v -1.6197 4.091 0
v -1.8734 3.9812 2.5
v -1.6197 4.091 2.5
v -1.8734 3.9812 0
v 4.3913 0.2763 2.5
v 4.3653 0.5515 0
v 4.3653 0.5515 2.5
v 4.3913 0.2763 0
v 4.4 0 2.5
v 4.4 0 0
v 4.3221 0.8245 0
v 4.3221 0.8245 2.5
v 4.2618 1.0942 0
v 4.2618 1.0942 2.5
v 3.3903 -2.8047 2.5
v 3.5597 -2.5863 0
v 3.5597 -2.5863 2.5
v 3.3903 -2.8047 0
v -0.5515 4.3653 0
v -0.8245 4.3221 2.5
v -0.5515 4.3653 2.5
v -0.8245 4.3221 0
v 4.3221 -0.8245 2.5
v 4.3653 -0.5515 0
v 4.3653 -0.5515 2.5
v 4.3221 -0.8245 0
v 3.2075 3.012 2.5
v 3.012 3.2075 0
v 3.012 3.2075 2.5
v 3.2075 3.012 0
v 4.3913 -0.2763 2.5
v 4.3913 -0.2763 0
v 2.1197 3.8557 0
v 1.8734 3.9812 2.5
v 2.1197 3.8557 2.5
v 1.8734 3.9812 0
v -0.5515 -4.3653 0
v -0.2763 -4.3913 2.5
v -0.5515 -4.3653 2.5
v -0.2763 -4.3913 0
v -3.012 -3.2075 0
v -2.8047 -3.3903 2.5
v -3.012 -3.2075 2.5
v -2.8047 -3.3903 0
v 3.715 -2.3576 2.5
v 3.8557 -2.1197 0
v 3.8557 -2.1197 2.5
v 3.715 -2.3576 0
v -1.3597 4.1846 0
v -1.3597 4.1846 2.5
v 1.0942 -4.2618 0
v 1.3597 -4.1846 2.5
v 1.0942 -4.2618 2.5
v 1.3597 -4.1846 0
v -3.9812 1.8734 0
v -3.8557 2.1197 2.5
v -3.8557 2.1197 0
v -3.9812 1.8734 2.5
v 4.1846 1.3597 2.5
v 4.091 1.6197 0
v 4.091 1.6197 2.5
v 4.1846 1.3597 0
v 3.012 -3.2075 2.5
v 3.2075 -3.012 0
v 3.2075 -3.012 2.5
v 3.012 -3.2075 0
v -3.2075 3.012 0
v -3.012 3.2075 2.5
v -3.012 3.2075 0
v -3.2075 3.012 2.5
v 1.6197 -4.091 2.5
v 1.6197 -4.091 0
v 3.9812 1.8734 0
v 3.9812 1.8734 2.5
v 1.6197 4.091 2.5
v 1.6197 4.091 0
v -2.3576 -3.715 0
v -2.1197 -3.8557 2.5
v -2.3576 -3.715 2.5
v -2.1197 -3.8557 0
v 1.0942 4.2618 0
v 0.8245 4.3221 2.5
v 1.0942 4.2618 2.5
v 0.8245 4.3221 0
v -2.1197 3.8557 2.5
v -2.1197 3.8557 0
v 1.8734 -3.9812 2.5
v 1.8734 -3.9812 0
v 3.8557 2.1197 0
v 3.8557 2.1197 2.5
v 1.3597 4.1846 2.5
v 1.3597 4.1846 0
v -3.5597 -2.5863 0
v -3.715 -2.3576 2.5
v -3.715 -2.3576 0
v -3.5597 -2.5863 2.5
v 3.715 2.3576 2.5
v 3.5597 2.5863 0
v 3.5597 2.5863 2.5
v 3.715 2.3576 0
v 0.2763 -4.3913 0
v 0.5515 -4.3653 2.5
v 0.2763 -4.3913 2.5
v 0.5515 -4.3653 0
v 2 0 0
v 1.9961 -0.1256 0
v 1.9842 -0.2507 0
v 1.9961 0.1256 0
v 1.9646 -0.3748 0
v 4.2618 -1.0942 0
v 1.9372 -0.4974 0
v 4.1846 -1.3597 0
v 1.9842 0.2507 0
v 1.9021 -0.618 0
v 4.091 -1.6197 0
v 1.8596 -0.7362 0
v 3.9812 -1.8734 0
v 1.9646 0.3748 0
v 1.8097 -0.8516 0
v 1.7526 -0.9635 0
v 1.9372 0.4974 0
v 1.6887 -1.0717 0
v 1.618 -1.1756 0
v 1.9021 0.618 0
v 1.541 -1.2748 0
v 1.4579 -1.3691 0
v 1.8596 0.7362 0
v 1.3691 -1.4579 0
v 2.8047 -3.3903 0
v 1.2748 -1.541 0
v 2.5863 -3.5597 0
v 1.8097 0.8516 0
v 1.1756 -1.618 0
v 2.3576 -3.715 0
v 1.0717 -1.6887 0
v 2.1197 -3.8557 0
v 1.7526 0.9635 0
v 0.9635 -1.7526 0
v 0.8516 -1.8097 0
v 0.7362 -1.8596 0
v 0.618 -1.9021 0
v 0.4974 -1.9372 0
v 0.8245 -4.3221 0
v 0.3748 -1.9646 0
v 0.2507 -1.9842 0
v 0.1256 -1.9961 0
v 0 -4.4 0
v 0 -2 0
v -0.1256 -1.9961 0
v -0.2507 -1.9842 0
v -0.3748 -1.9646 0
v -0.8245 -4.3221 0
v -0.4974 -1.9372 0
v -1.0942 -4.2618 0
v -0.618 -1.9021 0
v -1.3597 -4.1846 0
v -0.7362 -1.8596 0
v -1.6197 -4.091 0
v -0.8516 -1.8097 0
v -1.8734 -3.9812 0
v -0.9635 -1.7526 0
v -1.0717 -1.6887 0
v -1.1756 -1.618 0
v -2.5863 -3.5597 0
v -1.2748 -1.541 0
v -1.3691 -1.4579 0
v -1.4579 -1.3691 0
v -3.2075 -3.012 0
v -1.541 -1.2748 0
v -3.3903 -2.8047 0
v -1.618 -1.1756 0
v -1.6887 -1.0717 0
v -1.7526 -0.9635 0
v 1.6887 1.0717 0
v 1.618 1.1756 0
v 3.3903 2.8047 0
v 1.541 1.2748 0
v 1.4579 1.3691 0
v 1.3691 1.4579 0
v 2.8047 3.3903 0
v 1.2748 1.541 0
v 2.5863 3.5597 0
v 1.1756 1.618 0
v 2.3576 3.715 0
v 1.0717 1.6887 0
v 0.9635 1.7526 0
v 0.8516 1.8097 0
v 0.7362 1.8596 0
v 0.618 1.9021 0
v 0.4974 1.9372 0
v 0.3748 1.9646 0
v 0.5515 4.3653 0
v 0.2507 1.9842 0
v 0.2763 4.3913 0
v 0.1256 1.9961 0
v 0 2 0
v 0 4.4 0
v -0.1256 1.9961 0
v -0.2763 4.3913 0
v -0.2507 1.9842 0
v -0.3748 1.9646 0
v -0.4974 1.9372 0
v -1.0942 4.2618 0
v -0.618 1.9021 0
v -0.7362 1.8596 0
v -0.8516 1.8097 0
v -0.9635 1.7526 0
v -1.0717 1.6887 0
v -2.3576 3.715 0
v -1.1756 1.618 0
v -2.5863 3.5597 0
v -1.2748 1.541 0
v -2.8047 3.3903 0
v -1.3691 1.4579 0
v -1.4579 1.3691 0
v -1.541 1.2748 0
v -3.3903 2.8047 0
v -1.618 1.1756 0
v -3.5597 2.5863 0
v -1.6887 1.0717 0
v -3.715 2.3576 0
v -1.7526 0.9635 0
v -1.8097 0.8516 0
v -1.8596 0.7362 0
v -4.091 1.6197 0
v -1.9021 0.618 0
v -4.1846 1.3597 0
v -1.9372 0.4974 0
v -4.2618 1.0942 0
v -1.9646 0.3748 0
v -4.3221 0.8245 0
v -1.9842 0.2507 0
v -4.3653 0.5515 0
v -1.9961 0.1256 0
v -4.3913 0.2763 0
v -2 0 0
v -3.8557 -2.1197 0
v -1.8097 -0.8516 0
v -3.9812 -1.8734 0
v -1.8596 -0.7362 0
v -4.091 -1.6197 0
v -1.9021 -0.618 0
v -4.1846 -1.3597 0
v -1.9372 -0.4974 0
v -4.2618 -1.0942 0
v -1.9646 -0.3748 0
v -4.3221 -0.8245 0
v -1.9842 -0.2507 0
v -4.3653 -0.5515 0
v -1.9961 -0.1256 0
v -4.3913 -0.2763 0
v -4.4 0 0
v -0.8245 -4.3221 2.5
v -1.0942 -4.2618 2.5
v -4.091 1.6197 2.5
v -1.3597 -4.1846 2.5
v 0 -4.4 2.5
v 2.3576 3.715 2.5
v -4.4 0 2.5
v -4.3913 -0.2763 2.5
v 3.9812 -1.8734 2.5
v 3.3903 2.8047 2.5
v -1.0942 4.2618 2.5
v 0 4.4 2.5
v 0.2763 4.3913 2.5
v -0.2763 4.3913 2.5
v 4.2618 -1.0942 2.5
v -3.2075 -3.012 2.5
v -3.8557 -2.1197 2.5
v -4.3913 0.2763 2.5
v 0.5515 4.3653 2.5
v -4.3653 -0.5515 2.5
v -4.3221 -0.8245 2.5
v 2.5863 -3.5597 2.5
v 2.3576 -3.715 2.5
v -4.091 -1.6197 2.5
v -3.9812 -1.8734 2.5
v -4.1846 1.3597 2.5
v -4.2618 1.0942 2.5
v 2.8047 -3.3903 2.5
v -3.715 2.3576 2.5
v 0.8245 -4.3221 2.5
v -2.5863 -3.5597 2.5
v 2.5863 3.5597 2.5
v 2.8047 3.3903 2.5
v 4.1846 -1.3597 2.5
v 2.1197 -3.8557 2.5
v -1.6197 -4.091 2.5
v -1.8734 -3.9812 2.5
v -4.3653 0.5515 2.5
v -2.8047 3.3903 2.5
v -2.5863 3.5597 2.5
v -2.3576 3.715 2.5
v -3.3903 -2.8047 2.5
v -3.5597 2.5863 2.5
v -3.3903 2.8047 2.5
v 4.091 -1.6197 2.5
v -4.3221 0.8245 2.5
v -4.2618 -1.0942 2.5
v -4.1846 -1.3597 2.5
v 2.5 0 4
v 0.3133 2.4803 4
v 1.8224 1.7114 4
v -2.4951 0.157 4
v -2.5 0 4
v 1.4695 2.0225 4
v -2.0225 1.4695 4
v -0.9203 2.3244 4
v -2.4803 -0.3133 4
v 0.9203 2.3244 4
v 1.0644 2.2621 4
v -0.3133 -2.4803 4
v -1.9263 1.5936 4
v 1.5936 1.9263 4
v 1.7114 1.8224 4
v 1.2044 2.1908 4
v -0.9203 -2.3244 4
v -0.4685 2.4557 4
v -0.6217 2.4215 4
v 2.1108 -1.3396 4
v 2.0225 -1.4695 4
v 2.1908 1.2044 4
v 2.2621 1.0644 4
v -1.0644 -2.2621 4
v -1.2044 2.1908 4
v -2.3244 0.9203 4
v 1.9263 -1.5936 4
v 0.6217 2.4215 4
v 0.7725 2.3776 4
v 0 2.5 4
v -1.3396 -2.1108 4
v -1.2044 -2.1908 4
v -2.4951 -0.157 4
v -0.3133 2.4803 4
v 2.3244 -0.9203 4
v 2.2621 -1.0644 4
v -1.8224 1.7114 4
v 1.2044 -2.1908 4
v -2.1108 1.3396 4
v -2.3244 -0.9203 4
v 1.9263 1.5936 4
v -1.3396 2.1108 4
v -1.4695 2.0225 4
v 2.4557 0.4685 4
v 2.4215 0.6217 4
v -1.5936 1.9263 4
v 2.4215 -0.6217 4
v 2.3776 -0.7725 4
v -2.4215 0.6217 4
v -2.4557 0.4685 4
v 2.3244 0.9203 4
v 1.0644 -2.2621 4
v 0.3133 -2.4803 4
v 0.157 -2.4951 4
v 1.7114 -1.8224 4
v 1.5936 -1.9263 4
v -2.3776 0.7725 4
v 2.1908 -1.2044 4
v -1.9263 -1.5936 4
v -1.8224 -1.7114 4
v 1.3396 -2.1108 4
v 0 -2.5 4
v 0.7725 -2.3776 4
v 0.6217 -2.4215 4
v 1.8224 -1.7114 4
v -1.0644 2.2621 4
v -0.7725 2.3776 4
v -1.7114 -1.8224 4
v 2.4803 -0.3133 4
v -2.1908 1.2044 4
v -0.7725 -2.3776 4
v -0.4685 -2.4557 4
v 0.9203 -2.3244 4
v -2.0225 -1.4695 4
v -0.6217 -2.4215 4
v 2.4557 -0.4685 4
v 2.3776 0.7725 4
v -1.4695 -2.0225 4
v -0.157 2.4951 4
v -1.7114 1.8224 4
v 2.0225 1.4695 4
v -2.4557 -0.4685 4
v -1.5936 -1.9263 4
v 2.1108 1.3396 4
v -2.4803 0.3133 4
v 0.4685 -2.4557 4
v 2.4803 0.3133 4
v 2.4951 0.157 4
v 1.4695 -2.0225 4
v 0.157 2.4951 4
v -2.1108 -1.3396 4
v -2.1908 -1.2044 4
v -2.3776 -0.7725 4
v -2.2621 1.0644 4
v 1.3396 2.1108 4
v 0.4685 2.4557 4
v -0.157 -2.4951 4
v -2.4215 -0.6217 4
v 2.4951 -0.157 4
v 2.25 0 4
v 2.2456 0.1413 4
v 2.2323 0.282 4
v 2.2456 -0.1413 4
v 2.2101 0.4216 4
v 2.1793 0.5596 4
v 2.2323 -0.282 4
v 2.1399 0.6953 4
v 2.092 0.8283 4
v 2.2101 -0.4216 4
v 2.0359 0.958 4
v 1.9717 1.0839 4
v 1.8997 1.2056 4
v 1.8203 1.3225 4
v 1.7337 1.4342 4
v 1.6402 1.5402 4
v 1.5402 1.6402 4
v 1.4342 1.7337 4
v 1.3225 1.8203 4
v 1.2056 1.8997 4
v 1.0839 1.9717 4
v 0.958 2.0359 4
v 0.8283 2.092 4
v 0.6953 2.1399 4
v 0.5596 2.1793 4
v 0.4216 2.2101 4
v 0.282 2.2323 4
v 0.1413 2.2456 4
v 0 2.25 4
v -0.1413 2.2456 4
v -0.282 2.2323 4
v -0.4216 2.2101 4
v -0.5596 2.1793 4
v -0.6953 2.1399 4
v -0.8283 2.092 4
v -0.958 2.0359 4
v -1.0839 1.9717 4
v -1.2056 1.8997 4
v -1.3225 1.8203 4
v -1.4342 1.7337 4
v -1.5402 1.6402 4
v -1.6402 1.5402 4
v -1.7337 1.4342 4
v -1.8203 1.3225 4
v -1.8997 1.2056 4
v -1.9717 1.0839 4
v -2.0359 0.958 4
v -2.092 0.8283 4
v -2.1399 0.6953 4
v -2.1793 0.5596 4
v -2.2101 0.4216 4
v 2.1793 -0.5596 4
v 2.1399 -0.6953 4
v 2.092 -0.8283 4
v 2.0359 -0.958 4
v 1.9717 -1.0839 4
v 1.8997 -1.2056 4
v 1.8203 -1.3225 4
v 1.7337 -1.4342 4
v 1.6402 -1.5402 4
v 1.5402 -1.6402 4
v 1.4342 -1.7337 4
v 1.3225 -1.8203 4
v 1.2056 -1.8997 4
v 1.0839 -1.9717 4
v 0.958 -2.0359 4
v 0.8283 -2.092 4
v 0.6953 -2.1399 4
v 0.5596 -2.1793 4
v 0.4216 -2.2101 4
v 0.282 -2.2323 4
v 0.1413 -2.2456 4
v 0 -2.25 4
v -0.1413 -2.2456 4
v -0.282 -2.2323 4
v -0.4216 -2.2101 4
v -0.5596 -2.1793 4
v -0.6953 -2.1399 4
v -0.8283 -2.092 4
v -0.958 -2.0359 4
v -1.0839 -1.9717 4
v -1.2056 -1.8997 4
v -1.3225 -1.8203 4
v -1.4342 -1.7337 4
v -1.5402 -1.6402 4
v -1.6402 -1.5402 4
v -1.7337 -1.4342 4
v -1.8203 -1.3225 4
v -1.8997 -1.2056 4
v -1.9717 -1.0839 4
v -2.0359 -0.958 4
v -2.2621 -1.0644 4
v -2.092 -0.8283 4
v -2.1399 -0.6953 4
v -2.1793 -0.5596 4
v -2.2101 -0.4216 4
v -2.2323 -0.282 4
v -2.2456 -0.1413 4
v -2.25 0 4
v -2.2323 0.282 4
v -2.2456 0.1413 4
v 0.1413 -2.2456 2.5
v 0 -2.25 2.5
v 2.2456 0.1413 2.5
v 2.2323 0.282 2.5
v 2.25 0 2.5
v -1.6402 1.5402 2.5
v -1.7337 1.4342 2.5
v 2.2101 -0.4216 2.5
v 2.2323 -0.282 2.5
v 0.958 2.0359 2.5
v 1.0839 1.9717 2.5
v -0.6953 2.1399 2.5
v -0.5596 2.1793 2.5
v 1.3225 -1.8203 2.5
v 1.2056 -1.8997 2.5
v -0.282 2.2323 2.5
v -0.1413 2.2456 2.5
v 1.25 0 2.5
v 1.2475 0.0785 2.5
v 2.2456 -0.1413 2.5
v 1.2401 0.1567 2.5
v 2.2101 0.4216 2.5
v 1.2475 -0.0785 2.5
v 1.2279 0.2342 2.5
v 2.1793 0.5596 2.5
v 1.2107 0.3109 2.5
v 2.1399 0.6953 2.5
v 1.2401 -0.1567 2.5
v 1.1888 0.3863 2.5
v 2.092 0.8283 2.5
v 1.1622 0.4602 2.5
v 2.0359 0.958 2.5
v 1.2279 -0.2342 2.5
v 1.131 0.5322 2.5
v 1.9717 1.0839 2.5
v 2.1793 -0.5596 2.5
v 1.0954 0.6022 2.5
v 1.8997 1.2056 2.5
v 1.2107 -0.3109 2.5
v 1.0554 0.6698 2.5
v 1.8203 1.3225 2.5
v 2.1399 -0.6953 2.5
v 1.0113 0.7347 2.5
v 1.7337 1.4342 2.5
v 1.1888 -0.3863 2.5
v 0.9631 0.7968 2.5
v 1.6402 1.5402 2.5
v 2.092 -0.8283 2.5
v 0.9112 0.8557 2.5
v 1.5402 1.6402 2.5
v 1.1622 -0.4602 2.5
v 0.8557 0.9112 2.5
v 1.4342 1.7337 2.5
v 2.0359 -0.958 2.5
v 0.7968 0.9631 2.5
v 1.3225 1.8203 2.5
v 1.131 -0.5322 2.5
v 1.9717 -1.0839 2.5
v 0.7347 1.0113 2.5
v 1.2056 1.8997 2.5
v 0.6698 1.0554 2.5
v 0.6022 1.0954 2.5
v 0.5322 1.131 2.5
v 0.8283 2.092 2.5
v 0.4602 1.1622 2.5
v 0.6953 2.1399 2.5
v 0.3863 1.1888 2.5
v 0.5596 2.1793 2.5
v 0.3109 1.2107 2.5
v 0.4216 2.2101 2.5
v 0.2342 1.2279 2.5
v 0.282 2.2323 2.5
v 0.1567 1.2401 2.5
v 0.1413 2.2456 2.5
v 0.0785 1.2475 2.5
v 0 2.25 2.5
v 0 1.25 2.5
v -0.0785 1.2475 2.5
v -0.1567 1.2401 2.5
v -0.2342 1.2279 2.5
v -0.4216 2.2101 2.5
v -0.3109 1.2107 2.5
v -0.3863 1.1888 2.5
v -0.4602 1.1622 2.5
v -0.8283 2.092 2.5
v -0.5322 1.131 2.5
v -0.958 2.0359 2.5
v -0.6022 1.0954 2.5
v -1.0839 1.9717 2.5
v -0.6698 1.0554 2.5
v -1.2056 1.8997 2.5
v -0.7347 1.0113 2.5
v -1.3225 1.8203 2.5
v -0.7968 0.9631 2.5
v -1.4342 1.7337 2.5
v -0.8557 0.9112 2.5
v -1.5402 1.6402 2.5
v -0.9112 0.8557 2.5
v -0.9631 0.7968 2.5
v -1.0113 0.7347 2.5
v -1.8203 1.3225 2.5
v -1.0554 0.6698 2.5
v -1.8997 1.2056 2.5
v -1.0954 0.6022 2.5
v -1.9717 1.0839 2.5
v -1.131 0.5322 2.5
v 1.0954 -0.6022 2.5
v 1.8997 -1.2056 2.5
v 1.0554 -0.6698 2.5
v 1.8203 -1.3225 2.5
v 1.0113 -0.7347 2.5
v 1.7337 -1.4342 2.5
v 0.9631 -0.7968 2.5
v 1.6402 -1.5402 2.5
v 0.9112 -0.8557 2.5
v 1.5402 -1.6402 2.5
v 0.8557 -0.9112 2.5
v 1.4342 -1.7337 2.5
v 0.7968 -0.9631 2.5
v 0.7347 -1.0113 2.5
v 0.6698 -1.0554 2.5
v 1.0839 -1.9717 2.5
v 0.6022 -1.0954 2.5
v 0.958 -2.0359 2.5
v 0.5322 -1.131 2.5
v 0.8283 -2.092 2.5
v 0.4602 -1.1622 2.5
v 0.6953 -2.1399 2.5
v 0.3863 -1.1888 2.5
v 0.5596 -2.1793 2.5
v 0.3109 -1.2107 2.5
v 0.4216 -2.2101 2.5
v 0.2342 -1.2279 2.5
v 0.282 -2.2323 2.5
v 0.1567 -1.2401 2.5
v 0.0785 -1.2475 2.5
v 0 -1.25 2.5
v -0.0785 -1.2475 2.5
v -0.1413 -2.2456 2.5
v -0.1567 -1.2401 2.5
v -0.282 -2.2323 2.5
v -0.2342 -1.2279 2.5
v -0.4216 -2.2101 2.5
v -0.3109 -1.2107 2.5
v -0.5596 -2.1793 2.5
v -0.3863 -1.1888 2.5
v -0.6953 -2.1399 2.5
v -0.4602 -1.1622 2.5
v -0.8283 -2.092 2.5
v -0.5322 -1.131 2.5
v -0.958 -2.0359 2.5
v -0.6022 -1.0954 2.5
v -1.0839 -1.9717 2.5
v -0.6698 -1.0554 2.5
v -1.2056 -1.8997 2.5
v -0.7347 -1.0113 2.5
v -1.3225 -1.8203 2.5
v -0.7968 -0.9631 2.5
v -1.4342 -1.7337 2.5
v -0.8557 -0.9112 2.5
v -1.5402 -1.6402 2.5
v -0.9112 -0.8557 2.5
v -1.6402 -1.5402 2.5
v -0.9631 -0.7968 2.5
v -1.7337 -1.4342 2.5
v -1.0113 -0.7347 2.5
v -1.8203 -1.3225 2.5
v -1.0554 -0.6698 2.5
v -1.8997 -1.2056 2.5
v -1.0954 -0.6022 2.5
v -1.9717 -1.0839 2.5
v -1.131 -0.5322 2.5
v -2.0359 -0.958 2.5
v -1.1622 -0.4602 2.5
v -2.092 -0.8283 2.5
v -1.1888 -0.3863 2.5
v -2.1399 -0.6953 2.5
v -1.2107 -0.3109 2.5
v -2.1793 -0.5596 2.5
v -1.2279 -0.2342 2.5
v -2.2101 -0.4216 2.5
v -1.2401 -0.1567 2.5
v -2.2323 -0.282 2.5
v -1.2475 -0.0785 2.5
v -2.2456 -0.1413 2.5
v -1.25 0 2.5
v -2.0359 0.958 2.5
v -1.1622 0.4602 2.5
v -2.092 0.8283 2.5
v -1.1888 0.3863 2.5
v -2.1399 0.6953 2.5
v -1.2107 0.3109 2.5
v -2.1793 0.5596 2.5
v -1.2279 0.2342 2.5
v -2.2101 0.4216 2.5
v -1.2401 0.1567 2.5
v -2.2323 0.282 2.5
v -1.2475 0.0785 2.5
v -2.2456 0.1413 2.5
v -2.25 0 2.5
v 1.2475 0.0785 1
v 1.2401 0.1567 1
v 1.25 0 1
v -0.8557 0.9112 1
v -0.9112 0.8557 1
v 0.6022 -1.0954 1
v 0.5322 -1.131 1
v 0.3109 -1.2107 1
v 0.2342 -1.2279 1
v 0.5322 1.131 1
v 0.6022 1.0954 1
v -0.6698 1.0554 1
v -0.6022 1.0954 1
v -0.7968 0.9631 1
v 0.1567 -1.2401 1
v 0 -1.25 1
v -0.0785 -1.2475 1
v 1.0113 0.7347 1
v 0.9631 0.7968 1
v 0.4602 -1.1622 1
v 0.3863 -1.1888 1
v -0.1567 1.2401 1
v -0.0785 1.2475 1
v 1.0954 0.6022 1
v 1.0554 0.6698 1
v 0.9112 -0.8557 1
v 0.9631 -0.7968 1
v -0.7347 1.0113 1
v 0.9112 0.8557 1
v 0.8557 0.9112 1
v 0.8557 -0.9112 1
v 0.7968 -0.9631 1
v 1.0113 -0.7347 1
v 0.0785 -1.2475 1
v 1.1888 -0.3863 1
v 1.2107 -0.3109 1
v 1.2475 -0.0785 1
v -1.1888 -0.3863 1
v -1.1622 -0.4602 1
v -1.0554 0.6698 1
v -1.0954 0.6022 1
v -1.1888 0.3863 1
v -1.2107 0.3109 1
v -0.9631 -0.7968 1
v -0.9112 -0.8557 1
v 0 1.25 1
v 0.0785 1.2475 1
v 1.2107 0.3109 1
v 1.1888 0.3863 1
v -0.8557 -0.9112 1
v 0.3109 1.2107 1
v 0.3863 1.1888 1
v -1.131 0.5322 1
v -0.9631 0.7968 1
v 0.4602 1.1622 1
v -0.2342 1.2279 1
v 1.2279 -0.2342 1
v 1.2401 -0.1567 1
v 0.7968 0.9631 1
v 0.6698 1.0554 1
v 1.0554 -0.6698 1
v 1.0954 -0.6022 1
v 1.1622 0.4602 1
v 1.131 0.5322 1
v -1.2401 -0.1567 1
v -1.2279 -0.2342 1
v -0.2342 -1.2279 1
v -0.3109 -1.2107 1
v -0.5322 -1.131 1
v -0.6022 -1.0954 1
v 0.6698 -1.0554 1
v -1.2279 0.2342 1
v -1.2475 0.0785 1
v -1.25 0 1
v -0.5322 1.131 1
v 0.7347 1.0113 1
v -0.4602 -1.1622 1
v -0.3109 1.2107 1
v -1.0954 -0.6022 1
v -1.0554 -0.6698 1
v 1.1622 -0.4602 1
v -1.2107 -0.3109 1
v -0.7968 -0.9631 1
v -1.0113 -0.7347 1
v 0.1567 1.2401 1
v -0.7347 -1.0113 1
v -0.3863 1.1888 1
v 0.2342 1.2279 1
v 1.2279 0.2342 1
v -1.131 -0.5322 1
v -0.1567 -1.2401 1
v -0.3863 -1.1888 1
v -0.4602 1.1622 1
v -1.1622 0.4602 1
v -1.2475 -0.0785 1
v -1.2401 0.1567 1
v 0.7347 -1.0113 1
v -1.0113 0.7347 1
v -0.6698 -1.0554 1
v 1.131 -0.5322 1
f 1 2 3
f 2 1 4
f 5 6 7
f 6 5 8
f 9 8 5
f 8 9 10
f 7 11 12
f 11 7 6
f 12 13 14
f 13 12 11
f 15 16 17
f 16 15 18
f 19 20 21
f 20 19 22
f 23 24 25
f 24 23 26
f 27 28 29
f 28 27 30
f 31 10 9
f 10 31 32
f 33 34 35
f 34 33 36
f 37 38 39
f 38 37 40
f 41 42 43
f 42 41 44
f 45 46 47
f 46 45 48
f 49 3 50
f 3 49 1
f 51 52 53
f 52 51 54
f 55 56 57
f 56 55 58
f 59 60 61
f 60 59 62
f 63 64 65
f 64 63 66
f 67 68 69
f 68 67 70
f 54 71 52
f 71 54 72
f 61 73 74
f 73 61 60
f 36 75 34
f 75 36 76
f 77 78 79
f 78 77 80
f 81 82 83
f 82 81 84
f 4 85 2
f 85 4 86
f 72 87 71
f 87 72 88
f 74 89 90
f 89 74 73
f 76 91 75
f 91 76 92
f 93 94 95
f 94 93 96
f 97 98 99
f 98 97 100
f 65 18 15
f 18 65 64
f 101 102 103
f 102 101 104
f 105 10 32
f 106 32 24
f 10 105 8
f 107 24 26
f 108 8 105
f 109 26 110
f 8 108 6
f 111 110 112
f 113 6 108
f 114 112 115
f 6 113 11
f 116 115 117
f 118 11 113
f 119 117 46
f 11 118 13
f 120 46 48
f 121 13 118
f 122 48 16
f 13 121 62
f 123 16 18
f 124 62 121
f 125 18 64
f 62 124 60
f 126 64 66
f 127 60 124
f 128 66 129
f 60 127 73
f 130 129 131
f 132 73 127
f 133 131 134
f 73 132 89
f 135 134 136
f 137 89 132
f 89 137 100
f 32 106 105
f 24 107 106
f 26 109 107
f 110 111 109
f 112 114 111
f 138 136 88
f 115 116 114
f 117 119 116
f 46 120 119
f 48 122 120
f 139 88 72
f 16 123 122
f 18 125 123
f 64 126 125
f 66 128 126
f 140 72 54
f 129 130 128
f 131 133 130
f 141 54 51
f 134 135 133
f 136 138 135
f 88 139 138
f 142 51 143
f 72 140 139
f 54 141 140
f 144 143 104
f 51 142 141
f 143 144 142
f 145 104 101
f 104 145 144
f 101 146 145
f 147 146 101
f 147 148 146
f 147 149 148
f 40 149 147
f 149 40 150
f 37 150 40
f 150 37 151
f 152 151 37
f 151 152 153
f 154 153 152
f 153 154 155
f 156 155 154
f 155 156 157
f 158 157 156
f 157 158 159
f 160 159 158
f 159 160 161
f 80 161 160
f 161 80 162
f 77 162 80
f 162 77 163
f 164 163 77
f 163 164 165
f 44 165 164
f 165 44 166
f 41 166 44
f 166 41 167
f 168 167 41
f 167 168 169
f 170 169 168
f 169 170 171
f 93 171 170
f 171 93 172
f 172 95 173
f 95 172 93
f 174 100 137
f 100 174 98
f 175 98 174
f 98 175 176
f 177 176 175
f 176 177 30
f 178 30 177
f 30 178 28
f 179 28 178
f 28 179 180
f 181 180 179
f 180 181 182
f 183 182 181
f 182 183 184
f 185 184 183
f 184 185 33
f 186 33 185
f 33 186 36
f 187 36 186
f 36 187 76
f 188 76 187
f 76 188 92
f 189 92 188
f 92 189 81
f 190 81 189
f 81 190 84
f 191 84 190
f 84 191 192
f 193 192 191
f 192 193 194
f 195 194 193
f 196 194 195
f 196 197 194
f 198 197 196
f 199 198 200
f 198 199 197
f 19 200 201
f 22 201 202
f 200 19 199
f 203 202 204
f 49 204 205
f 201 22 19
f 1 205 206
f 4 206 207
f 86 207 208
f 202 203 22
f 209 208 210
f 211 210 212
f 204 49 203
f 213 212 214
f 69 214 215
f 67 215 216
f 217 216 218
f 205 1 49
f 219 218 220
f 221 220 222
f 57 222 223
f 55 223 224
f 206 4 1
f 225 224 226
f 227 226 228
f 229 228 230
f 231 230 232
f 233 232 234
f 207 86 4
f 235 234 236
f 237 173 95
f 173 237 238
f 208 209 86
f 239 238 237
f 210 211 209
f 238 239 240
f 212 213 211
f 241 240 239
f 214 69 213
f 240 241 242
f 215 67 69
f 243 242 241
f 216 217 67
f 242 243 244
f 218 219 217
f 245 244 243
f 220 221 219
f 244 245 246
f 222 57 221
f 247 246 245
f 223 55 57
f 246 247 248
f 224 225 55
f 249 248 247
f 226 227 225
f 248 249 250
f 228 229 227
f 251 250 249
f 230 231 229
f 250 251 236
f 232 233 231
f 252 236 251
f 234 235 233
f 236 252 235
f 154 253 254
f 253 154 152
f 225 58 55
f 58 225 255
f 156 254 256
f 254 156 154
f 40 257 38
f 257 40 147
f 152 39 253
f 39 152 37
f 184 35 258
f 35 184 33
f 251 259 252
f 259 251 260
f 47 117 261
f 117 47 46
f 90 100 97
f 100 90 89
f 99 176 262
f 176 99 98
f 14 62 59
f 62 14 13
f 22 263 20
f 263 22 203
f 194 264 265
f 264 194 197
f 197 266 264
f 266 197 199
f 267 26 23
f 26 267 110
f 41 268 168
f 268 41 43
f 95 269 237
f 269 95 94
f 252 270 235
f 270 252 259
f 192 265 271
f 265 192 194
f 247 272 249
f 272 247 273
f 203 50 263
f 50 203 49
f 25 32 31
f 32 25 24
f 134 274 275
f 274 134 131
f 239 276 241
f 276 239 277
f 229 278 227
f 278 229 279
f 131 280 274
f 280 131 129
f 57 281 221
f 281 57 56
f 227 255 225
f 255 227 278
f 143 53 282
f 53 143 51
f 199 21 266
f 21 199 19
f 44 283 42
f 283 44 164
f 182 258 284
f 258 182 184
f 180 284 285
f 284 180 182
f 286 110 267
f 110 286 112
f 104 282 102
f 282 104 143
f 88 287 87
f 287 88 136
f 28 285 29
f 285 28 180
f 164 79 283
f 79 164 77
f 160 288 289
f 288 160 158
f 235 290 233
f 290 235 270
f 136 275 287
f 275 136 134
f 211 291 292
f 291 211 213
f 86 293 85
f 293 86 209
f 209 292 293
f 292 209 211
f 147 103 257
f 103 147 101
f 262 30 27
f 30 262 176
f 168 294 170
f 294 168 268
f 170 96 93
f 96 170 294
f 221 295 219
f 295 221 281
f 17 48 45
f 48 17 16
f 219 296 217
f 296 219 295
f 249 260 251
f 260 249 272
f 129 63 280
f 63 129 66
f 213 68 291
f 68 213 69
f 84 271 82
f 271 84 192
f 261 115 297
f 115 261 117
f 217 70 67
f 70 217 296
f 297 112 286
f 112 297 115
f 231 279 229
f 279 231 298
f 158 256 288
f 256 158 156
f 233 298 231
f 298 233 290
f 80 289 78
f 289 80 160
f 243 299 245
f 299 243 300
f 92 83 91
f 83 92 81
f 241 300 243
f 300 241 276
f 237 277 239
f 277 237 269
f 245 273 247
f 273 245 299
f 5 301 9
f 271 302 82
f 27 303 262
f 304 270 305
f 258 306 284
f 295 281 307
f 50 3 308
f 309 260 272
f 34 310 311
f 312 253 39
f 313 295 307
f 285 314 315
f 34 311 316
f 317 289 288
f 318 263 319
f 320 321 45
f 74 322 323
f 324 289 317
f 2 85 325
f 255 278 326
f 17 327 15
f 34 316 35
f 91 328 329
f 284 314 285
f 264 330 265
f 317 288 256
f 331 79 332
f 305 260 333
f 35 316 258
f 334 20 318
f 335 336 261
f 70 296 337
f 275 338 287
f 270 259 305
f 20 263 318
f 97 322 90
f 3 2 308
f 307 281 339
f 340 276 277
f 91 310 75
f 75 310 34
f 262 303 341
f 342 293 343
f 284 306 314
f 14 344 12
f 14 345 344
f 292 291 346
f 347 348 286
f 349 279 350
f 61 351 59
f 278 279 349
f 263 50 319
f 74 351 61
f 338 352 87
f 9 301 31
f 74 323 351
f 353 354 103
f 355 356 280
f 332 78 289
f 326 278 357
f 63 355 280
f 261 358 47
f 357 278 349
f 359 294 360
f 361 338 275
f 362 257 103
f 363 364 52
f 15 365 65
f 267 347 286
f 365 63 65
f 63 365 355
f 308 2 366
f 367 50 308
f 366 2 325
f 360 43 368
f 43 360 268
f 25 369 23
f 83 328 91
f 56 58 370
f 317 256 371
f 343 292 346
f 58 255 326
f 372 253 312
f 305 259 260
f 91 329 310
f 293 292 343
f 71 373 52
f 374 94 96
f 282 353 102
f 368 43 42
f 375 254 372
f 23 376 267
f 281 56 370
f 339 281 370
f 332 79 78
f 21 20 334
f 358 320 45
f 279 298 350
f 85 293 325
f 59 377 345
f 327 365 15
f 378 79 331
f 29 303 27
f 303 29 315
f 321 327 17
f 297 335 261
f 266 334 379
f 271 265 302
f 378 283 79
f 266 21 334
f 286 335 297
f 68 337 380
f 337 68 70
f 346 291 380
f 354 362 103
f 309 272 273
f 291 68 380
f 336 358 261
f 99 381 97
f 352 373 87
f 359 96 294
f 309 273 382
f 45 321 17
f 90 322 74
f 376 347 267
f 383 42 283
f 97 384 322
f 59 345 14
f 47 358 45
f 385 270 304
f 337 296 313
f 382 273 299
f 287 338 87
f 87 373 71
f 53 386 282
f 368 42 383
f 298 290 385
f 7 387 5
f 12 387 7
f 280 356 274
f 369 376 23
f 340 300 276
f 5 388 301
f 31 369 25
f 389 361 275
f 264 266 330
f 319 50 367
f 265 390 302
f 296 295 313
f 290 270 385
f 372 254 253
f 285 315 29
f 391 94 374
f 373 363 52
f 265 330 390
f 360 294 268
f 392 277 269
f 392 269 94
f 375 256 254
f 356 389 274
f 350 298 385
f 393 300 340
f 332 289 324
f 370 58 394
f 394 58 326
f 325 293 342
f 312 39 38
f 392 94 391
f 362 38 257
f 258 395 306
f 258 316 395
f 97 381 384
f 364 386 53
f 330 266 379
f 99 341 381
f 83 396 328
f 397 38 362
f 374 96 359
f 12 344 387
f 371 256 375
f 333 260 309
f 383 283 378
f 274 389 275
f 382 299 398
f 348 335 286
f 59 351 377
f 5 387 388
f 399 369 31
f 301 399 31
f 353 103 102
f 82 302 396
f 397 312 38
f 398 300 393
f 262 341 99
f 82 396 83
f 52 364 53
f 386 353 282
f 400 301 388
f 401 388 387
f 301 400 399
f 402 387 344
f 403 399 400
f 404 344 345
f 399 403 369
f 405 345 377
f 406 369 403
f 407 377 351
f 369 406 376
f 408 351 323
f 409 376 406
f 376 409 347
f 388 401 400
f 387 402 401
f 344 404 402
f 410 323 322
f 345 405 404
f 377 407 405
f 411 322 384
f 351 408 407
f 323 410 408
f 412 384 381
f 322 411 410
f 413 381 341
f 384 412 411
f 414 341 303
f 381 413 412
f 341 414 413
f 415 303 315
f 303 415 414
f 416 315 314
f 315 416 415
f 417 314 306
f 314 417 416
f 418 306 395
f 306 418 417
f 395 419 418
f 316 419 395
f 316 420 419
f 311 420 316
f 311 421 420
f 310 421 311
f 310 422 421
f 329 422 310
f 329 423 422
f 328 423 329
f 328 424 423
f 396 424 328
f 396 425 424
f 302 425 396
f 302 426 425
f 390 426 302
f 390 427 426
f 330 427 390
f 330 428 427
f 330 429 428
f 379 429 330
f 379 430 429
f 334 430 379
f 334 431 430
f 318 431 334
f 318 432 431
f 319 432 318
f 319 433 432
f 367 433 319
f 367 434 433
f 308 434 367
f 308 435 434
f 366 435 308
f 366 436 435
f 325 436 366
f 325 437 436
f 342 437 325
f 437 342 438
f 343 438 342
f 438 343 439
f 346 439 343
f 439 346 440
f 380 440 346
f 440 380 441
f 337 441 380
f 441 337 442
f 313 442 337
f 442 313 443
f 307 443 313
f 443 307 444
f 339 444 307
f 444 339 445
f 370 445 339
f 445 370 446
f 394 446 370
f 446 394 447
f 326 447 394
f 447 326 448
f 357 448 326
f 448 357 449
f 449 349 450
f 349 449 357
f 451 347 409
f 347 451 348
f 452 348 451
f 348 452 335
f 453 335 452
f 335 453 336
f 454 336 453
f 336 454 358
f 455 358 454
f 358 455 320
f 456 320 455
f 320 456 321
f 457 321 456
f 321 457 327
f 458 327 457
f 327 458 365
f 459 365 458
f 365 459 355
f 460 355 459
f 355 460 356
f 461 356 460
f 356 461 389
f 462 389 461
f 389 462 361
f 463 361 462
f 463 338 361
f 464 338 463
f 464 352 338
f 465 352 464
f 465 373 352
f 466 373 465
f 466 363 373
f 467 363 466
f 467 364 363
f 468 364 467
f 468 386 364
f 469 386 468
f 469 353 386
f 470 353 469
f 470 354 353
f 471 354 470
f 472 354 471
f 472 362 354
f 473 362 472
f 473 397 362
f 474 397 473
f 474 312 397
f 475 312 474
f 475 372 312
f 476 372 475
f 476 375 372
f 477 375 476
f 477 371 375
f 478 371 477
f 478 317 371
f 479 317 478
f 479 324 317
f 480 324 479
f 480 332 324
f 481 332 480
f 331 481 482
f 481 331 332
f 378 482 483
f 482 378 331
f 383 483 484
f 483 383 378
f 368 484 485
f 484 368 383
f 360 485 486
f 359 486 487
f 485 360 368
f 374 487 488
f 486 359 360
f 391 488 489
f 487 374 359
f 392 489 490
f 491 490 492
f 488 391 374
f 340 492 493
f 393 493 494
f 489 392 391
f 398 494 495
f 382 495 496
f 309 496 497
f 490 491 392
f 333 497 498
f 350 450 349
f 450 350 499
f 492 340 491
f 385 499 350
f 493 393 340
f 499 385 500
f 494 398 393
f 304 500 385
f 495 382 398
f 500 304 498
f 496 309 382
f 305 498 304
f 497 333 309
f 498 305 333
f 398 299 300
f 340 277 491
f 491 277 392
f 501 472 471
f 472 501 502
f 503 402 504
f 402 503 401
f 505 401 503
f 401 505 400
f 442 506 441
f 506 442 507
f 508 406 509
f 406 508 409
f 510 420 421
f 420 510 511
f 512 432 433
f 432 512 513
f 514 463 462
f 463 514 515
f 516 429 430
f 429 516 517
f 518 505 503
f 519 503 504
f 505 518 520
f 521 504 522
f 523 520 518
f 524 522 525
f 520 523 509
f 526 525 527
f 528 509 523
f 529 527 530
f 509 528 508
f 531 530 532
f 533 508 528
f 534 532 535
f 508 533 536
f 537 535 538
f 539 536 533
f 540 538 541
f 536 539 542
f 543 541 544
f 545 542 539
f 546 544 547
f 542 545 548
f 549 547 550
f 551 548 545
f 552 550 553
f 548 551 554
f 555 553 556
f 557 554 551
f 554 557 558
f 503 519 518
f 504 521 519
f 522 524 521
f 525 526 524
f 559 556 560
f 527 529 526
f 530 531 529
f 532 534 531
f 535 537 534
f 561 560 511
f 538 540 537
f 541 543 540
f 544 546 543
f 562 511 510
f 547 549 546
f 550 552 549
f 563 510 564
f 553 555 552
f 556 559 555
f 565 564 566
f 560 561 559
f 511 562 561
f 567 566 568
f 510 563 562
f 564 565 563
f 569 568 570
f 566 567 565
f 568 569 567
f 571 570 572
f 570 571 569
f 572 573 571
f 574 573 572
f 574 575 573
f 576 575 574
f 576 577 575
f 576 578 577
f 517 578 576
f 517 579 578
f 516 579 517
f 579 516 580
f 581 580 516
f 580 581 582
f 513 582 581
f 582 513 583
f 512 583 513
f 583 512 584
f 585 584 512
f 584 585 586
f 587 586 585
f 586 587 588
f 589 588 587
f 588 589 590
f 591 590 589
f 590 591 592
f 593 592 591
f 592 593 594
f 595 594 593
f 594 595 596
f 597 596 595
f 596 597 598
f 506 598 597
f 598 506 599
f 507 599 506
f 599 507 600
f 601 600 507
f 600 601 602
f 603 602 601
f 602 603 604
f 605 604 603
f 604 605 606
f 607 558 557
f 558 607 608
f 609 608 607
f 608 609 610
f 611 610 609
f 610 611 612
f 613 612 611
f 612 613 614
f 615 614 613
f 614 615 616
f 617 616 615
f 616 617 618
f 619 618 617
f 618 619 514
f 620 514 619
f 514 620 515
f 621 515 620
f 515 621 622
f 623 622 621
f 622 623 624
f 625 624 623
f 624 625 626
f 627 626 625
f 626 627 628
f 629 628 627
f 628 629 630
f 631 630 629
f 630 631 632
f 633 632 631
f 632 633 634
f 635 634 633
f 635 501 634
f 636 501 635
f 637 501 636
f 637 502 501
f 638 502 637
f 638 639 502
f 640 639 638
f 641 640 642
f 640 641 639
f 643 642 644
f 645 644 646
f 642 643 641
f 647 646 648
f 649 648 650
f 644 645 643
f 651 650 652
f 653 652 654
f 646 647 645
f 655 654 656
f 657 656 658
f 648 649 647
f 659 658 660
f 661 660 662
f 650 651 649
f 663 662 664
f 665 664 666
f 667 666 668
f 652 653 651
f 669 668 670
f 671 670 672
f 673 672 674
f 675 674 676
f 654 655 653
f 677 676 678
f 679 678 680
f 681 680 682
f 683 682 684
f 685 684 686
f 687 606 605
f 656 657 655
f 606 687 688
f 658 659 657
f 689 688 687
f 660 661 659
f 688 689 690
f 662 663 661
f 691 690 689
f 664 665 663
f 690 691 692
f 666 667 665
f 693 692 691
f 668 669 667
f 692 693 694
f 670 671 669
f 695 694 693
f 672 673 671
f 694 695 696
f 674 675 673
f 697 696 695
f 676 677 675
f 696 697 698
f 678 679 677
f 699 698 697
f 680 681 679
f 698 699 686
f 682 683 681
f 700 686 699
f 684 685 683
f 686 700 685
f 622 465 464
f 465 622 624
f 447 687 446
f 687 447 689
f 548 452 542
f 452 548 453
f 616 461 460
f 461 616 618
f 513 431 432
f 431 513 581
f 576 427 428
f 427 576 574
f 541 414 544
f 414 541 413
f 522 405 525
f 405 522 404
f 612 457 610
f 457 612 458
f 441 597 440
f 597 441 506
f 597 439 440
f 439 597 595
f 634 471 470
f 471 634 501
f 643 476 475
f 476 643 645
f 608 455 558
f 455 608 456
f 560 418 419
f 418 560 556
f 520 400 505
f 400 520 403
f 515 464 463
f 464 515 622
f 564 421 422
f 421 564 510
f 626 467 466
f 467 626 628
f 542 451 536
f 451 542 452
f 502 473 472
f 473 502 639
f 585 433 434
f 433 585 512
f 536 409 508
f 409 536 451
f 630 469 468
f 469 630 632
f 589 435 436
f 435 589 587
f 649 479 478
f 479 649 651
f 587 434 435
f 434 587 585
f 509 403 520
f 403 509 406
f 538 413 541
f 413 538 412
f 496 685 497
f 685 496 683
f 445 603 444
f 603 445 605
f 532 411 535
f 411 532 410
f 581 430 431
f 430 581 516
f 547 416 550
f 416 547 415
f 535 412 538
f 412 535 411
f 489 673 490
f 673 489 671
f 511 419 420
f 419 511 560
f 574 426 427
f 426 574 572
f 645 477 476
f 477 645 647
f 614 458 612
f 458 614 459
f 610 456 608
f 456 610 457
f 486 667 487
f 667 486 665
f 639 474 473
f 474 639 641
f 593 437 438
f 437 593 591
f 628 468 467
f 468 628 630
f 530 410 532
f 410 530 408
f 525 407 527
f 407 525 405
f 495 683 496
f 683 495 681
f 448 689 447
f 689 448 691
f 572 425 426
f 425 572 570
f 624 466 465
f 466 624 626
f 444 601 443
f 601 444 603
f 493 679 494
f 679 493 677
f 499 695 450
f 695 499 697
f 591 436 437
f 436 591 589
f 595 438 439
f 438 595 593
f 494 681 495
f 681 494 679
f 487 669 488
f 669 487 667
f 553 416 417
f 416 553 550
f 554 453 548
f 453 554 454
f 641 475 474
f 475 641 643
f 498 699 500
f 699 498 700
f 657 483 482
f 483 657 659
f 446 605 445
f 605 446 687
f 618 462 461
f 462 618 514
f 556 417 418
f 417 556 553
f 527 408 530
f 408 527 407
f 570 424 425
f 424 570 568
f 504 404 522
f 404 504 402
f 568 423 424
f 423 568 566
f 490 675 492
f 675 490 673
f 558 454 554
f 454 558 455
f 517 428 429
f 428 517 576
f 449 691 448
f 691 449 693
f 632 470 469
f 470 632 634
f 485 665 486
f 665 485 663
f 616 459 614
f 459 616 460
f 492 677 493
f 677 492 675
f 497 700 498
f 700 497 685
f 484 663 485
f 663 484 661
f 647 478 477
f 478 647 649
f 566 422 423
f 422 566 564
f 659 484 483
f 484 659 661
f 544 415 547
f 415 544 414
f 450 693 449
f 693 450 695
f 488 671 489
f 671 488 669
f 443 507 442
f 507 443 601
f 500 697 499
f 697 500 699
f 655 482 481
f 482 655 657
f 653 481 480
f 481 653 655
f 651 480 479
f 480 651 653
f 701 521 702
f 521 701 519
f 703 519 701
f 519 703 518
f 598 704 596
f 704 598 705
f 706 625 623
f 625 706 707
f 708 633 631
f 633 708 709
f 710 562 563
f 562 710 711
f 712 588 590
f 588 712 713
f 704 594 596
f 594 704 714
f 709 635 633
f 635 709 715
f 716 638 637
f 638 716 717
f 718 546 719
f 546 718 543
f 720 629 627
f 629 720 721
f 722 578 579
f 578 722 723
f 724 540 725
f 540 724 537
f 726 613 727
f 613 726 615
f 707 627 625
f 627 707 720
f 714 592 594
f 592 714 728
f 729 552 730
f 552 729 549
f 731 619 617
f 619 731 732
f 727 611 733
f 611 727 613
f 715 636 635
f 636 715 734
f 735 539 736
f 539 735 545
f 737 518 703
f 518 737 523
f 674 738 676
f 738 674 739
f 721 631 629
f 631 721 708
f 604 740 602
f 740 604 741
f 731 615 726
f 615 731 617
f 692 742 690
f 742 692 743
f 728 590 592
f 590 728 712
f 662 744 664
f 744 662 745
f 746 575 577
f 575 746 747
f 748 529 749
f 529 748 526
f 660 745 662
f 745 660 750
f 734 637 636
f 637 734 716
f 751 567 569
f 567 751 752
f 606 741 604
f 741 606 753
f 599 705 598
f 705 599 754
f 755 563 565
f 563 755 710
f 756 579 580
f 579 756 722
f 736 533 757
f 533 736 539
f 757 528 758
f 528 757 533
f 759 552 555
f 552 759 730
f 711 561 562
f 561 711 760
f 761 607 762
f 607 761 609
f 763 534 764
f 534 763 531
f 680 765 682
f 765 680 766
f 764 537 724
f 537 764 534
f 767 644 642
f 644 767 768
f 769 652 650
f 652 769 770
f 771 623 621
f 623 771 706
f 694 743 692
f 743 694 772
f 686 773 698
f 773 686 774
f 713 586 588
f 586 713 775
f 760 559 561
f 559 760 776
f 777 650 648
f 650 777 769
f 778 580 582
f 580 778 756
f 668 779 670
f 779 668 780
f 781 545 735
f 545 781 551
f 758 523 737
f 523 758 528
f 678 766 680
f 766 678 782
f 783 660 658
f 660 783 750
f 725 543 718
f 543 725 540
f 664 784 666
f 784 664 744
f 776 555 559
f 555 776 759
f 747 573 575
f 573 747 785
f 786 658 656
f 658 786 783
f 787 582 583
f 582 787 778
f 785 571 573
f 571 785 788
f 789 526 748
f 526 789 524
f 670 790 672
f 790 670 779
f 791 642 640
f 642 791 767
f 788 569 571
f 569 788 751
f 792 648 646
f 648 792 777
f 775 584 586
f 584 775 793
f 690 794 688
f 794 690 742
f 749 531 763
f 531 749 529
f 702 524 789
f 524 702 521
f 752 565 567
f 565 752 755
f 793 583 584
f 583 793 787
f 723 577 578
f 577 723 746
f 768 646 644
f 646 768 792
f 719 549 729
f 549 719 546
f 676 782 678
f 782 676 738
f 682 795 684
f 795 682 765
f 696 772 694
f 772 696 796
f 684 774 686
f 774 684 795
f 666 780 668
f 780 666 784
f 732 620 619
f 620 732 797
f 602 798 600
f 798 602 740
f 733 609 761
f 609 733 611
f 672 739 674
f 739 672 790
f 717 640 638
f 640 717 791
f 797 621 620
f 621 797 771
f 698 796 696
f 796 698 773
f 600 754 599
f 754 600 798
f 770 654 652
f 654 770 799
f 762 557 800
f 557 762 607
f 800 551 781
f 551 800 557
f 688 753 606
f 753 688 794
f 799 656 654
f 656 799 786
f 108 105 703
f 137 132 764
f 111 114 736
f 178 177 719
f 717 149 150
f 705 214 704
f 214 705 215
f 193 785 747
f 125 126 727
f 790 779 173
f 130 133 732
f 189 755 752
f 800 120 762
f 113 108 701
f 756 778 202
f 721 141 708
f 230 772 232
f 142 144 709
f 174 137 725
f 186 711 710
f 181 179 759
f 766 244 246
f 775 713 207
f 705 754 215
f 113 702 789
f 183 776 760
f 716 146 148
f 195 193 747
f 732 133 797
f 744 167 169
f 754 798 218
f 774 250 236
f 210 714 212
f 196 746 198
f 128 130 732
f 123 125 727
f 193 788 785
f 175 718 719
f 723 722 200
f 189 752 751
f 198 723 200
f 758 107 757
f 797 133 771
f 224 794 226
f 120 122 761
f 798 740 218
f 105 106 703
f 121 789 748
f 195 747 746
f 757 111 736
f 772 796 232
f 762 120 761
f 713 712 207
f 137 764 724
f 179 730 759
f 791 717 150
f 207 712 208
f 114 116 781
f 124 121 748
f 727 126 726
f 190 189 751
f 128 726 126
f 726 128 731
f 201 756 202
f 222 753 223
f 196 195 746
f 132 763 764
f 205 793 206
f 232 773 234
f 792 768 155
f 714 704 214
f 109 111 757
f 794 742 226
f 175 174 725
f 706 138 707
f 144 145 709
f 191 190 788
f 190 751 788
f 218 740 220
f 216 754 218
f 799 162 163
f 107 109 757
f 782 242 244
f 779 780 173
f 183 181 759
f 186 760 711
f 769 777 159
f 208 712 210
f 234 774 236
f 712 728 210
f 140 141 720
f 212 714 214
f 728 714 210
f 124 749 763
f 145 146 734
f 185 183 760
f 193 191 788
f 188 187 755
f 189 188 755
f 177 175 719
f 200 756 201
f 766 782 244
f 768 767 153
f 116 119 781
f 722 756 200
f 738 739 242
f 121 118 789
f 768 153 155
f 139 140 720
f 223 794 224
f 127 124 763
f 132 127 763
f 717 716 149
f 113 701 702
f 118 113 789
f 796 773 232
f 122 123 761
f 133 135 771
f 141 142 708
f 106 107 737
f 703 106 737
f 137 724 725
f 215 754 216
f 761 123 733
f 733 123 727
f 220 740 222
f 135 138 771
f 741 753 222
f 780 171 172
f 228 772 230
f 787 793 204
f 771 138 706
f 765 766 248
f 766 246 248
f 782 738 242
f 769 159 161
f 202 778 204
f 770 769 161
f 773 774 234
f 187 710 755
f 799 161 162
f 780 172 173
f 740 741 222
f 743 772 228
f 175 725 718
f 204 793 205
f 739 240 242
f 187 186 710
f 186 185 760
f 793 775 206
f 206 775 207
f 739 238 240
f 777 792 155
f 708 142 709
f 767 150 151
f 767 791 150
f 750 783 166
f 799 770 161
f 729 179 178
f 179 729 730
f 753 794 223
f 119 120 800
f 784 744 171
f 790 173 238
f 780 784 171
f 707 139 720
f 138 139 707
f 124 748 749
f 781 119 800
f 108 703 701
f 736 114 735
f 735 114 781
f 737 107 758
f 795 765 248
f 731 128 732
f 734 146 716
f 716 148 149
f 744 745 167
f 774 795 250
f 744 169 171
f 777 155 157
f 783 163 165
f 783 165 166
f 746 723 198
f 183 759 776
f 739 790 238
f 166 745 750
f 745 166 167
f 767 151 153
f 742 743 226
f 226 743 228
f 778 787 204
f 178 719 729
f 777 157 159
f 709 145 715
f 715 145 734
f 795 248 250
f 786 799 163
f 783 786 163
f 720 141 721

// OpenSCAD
// See https://www.thingiverse.com/thing:3203831

ptfe_tube_length = 42.5;

h = 2.5;

$fn=100;

difference(){
    union() {
        cylinder(d=9-0.2, h = h);
        translate([0, 0, h]) cylinder(d1 = 9-0.2, d2 = 4+1, h = 1.5);
    }
    translate([0, 0, h]) cylinder(d=4+0.5, h = 9.999);
    cylinder(d = 2+0.5, h = h);
    cylinder(d2 = 2+0.5, d1 = 4, h = 1);
}
